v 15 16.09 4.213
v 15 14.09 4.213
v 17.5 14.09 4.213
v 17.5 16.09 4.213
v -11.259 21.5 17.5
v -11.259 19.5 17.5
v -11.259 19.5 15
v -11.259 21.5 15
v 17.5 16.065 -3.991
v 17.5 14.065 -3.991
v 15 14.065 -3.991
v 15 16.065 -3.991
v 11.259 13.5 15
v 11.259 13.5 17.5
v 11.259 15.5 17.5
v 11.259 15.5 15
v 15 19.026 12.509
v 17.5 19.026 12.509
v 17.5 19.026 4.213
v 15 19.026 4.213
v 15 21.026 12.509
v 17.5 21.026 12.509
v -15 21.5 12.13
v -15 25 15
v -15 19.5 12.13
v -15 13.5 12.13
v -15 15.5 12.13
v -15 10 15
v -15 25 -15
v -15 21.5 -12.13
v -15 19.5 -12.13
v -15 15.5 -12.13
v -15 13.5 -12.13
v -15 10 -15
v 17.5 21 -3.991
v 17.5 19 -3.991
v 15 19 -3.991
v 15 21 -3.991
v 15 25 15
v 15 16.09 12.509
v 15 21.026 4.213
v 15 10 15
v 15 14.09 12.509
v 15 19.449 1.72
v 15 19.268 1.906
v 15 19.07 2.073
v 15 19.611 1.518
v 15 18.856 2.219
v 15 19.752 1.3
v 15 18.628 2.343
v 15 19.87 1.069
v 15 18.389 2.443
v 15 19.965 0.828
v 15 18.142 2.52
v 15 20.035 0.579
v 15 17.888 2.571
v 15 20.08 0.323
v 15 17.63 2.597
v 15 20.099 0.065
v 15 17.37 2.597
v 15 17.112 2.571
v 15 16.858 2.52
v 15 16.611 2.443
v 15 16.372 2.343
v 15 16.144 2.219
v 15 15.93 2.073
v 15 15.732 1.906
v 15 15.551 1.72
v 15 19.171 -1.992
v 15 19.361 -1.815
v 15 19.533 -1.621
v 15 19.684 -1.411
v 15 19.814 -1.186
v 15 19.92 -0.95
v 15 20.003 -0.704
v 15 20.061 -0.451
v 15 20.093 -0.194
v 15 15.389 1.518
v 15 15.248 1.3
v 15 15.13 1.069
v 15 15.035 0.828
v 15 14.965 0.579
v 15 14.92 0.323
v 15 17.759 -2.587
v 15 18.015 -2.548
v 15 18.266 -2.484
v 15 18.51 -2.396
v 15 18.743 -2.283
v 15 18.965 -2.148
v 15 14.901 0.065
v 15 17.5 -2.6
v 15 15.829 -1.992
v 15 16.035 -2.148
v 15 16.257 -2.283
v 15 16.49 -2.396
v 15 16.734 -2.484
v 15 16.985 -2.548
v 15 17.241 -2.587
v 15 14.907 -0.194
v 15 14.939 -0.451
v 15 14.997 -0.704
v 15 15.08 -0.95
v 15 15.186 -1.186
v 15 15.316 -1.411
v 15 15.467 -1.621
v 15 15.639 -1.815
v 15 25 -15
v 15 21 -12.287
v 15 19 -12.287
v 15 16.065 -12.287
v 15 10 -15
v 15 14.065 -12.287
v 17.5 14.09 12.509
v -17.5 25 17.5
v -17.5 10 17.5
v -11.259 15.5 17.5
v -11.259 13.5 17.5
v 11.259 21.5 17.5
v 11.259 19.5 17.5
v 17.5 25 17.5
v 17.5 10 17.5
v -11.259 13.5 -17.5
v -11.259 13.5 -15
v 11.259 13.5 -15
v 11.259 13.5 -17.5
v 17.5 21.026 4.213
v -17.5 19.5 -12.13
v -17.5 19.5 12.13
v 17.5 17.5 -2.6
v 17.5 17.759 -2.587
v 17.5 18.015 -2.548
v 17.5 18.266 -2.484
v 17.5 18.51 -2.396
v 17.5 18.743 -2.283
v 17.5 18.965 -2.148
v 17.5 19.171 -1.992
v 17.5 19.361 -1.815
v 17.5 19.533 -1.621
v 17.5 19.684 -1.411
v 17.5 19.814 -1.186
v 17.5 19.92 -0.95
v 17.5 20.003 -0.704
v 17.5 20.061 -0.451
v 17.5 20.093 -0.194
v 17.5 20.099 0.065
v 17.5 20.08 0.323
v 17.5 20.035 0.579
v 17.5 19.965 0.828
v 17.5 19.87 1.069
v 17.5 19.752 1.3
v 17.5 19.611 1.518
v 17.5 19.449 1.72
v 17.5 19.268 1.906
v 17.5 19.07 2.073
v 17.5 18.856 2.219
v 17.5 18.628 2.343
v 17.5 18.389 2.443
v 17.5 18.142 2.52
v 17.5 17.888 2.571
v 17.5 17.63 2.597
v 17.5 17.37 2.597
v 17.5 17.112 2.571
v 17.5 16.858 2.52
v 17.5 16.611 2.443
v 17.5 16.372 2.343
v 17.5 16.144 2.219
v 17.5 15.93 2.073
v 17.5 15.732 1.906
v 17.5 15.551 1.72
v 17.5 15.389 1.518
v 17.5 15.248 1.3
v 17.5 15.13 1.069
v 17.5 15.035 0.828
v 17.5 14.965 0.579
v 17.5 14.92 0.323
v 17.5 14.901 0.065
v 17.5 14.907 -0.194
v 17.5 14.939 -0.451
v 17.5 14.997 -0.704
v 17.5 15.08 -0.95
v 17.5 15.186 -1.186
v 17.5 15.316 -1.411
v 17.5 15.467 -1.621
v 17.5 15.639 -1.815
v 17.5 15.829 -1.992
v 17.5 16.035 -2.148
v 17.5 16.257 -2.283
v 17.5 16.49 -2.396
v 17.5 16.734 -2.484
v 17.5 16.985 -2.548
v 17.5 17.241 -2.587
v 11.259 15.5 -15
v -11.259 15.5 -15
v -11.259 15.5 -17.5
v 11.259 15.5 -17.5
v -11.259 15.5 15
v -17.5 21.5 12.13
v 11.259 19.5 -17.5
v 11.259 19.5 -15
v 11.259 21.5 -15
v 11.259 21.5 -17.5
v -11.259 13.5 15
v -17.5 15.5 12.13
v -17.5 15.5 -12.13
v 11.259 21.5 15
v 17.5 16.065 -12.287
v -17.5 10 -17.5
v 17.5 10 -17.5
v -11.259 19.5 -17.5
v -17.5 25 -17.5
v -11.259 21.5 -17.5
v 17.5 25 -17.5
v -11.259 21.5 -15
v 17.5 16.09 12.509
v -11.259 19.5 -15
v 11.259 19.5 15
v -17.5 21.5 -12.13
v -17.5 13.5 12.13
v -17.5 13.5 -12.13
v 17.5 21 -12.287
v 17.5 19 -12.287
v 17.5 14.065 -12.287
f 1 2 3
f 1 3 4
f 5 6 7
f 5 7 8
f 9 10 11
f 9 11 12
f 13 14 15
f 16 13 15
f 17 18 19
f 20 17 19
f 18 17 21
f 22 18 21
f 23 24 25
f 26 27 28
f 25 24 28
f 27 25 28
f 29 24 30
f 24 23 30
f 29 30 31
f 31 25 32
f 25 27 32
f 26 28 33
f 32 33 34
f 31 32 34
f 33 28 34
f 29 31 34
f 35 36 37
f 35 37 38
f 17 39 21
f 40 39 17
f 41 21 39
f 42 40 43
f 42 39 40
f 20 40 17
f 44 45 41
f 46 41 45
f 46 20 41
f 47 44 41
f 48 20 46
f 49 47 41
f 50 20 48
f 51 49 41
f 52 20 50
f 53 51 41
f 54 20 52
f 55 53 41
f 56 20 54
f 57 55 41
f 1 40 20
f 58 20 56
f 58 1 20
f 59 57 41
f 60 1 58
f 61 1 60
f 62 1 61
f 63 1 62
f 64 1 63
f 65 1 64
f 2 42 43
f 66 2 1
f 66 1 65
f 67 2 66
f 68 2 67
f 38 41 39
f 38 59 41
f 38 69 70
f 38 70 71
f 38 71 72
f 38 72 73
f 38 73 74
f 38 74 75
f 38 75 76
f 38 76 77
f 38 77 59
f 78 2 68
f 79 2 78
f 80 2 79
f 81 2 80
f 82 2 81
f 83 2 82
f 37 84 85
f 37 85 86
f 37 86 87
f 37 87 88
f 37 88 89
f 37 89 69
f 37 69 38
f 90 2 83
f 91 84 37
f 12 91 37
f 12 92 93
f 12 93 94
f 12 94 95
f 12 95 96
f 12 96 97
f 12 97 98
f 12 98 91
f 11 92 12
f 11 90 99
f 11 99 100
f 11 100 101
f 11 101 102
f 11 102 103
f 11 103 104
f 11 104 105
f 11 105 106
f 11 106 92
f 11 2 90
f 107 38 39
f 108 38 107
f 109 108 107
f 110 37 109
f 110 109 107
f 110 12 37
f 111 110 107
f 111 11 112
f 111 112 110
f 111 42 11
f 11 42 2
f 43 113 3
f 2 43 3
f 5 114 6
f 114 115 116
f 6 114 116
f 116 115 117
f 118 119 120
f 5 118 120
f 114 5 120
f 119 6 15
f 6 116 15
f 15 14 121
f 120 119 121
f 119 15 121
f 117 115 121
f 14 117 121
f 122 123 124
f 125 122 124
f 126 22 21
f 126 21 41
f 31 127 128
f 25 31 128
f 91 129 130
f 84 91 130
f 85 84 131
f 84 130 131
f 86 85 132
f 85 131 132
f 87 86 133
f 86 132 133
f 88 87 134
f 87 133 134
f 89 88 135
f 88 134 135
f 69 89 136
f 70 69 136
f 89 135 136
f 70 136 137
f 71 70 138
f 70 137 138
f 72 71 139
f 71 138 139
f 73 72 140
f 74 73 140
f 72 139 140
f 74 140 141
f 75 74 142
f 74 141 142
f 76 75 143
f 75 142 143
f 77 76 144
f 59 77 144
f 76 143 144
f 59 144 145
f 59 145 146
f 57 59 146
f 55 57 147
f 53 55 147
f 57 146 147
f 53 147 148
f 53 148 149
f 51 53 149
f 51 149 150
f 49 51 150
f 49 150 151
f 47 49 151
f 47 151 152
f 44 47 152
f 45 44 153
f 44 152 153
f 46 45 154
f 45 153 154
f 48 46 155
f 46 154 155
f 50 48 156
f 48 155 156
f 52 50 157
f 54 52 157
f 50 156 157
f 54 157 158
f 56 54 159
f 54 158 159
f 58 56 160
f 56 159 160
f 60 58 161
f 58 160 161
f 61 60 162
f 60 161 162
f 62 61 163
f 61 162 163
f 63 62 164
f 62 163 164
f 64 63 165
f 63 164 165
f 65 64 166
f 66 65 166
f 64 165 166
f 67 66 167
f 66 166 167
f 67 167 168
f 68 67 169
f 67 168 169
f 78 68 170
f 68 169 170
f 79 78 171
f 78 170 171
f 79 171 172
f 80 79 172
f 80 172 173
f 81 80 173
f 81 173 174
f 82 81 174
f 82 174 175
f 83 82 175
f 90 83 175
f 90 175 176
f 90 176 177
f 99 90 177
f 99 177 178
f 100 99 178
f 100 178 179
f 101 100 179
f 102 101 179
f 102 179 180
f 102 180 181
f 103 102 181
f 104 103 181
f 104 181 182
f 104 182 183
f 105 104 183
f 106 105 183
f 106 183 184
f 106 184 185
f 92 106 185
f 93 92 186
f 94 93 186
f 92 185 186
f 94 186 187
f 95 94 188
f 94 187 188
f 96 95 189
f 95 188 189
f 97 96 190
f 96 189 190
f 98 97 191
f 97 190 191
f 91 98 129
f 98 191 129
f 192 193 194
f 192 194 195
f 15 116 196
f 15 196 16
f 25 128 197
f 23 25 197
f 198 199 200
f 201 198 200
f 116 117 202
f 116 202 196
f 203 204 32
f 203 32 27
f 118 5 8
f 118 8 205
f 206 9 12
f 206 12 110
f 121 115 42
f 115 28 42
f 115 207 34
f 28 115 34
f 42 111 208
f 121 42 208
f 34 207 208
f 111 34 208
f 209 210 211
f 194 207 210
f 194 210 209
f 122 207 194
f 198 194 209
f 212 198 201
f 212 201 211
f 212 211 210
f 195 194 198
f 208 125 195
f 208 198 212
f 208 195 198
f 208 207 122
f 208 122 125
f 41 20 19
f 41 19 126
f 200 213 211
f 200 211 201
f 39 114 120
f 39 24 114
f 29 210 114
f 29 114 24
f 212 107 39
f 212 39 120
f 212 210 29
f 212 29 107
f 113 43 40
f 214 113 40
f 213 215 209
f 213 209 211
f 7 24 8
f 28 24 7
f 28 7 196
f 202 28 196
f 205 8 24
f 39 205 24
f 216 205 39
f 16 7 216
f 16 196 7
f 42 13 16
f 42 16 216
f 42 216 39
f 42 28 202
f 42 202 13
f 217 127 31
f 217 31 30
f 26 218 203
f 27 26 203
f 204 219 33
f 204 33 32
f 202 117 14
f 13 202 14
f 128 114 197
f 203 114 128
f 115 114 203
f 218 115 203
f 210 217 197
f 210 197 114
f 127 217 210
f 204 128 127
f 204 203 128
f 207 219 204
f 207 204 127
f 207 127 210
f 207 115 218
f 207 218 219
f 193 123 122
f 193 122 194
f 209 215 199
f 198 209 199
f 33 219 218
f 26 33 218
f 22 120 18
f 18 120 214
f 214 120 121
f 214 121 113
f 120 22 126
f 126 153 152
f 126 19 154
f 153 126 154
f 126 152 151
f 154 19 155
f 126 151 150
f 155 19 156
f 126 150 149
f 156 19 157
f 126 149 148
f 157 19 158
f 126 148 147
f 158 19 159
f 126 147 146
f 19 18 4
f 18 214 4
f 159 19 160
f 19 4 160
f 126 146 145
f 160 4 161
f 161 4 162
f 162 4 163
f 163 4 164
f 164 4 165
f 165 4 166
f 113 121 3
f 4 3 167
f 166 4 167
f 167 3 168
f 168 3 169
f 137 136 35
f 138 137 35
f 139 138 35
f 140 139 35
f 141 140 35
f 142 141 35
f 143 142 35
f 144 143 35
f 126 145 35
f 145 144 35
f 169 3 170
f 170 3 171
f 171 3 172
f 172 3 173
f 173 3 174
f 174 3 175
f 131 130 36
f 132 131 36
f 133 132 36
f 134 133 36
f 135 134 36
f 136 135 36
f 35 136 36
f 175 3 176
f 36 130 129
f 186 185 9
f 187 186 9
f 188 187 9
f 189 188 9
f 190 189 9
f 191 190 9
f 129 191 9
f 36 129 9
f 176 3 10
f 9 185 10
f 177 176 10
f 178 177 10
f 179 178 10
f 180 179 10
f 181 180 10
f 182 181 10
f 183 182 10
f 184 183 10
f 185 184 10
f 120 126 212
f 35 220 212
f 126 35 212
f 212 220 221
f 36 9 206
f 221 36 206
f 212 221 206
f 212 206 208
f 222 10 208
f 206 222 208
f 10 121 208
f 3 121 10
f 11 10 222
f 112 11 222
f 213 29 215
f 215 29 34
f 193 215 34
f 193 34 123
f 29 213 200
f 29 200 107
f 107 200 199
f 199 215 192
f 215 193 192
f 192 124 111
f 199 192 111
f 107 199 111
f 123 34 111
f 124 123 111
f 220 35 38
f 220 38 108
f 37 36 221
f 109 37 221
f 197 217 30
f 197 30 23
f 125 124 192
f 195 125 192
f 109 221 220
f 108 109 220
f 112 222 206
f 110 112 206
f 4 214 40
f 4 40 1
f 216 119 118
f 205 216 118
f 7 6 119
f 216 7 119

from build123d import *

# Parameters (mm, degrees)
SKETCH2_W           = 35
SKETCH2_H           = 35
BOSS_EXTRUDE1_DEPTH = 10
SKETCH3_W           = 35
SKETCH3_H           = 35
SKETCH3_W_2         = 30
SKETCH3_H_2         = 30
BOSS_EXTRUDE2_DEPTH = 15
SKETCH4_W           = 35
SKETCH4_H           = 35
BOSS_EXTRUDE3_DEPTH = 15
CUT_EXTRUDE1_START  = -40
SKETCH5_R           = 3.05
CUT_EXTRUDE1_DEPTH  = 40
SKETCH6_R           = 2.6
SKETCH6_W           = 8.296096318
SKETCH6_H           = 2.00000001
SKETCH6_H_2         = 2.000000011
CUT_EXTRUDE2_DEPTH  = 2.5
CUT_EXTRUDE3_REACH  = 48.435
SKETCH7_W           = 22.518110106
SKETCH7_H           = 2
SKETCH8_W           = 24.260657828
SKETCH8_H           = 2
CUT_EXTRUDE4_DEPTH  = 2.5


with BuildPart() as part:
    # Sketch2 → Boss-Extrude1 (new body)
    with BuildSketch(Plane(origin=(0, 0, 0), x_dir=(1, 0, 0), z_dir=(0, 1, 0))):
        Rectangle(SKETCH2_W, SKETCH2_H)
    extrude(amount=BOSS_EXTRUDE1_DEPTH)


with BuildPart() as body_2:
    # Sketch3 → Boss-Extrude2 (new body)
    with BuildSketch(Plane(origin=(0, 10, 0), x_dir=(1, 0, 0), z_dir=(0, 1, 0))):
        Rectangle(SKETCH3_W, SKETCH3_H)
        Rectangle(SKETCH3_W_2, SKETCH3_H_2, mode=Mode.SUBTRACT)
    extrude(amount=BOSS_EXTRUDE2_DEPTH)

    # Sketch6 → Cut-Extrude2 (cut)
    with BuildSketch(Plane(origin=(17.5, 0, 0), x_dir=(0, 0, -1), z_dir=(1, 0, 0))):
        with Locations((0, 17.5)):
            Circle(SKETCH6_R)
        with Locations((8.1389247, 15.064547851)):
            Rectangle(SKETCH6_W, SKETCH6_H)
        with Locations((8.1389247, 20.000000005)):
            Rectangle(SKETCH6_W, SKETCH6_H)
        with Locations((-8.361055595, 15.090047995)):
            Rectangle(SKETCH6_W, SKETCH6_H)
        with Locations((-8.361055595, 20.025500149)):
            Rectangle(SKETCH6_W, SKETCH6_H_2)
    extrude(amount=-CUT_EXTRUDE2_DEPTH, mode=Mode.SUBTRACT)

    # Cut-Extrude3: up to this face of the body (flat: up to its plane)
    cut_extrude3_end = Plane(body_2.part.faces().sort_by_distance((0, 17.5, -17.5))[0])
    # Sketch7 → Cut-Extrude3 (cut, up to the picked face)
    with BuildSketch(Plane.XY.offset(17.5), mode=Mode.PRIVATE) as cut_extrude3_sk1:
        with Locations((0, 20.5)):
            Rectangle(SKETCH7_W, SKETCH7_H)
    cut_extrude3_tool1 = split(extrude(cut_extrude3_sk1.sketch, amount=-CUT_EXTRUDE3_REACH, mode=Mode.PRIVATE), bisect_by=cut_extrude3_end, keep=Keep.BOTH, mode=Mode.PRIVATE)
    # Sketch7 → Cut-Extrude3 (cut, up to the picked face)
    with BuildSketch(Plane.XY.offset(17.5), mode=Mode.PRIVATE) as cut_extrude3_sk2:
        with Locations((0, 14.5)):
            Rectangle(SKETCH7_W, SKETCH7_H)
    cut_extrude3_tool2 = split(extrude(cut_extrude3_sk2.sketch, amount=-CUT_EXTRUDE3_REACH, mode=Mode.PRIVATE), bisect_by=cut_extrude3_end, keep=Keep.BOTH, mode=Mode.PRIVATE)
    add(cut_extrude3_tool1.solids().sort_by(Axis((0, 20.5, 17.5), (0, 0, -1)))[0], mode=Mode.SUBTRACT)
    add(cut_extrude3_tool2.solids().sort_by(Axis((0, 14.5, 17.5), (0, 0, -1)))[0], mode=Mode.SUBTRACT)

    # Sketch8 → Cut-Extrude4 (cut)
    with BuildSketch(Plane.ZY.offset(17.5)):
        with Locations((0, 20.5)):
            Rectangle(SKETCH8_W, SKETCH8_H)
        with Locations((0, 14.5)):
            Rectangle(SKETCH8_W, SKETCH8_H)
    extrude(amount=-CUT_EXTRUDE4_DEPTH, mode=Mode.SUBTRACT)


with BuildPart() as body_3:
    # Sketch4 → Boss-Extrude3 (new body)
    with BuildSketch(Plane(origin=(0, 25, 0), x_dir=(1, 0, 0), z_dir=(0, 1, 0))):
        Rectangle(SKETCH4_W, SKETCH4_H)
    extrude(amount=BOSS_EXTRUDE3_DEPTH)


with BuildPart() as cut_extrude1_tool:
    # Sketch5 → Cut-Extrude1 (new body)
    with BuildSketch(Plane(origin=(0, 40, 0), x_dir=(1, 0, 0), z_dir=(0, 1, 0)).offset(CUT_EXTRUDE1_START)):
        with Locations(Location((0, 0, 0), (0, 0, 270))):
            Circle(SKETCH5_R)
    extrude(amount=CUT_EXTRUDE1_DEPTH)


with BuildPart() as part_1:
    add(part.part)

    # Cut-Extrude1: cut by cut_extrude1_tool
    add(cut_extrude1_tool.part, mode=Mode.SUBTRACT)


with BuildPart() as body_3_1:
    add(body_3.part)

    # Cut-Extrude1: cut by cut_extrude1_tool
    add(cut_extrude1_tool.part, mode=Mode.SUBTRACT)


solid = body_2.part
